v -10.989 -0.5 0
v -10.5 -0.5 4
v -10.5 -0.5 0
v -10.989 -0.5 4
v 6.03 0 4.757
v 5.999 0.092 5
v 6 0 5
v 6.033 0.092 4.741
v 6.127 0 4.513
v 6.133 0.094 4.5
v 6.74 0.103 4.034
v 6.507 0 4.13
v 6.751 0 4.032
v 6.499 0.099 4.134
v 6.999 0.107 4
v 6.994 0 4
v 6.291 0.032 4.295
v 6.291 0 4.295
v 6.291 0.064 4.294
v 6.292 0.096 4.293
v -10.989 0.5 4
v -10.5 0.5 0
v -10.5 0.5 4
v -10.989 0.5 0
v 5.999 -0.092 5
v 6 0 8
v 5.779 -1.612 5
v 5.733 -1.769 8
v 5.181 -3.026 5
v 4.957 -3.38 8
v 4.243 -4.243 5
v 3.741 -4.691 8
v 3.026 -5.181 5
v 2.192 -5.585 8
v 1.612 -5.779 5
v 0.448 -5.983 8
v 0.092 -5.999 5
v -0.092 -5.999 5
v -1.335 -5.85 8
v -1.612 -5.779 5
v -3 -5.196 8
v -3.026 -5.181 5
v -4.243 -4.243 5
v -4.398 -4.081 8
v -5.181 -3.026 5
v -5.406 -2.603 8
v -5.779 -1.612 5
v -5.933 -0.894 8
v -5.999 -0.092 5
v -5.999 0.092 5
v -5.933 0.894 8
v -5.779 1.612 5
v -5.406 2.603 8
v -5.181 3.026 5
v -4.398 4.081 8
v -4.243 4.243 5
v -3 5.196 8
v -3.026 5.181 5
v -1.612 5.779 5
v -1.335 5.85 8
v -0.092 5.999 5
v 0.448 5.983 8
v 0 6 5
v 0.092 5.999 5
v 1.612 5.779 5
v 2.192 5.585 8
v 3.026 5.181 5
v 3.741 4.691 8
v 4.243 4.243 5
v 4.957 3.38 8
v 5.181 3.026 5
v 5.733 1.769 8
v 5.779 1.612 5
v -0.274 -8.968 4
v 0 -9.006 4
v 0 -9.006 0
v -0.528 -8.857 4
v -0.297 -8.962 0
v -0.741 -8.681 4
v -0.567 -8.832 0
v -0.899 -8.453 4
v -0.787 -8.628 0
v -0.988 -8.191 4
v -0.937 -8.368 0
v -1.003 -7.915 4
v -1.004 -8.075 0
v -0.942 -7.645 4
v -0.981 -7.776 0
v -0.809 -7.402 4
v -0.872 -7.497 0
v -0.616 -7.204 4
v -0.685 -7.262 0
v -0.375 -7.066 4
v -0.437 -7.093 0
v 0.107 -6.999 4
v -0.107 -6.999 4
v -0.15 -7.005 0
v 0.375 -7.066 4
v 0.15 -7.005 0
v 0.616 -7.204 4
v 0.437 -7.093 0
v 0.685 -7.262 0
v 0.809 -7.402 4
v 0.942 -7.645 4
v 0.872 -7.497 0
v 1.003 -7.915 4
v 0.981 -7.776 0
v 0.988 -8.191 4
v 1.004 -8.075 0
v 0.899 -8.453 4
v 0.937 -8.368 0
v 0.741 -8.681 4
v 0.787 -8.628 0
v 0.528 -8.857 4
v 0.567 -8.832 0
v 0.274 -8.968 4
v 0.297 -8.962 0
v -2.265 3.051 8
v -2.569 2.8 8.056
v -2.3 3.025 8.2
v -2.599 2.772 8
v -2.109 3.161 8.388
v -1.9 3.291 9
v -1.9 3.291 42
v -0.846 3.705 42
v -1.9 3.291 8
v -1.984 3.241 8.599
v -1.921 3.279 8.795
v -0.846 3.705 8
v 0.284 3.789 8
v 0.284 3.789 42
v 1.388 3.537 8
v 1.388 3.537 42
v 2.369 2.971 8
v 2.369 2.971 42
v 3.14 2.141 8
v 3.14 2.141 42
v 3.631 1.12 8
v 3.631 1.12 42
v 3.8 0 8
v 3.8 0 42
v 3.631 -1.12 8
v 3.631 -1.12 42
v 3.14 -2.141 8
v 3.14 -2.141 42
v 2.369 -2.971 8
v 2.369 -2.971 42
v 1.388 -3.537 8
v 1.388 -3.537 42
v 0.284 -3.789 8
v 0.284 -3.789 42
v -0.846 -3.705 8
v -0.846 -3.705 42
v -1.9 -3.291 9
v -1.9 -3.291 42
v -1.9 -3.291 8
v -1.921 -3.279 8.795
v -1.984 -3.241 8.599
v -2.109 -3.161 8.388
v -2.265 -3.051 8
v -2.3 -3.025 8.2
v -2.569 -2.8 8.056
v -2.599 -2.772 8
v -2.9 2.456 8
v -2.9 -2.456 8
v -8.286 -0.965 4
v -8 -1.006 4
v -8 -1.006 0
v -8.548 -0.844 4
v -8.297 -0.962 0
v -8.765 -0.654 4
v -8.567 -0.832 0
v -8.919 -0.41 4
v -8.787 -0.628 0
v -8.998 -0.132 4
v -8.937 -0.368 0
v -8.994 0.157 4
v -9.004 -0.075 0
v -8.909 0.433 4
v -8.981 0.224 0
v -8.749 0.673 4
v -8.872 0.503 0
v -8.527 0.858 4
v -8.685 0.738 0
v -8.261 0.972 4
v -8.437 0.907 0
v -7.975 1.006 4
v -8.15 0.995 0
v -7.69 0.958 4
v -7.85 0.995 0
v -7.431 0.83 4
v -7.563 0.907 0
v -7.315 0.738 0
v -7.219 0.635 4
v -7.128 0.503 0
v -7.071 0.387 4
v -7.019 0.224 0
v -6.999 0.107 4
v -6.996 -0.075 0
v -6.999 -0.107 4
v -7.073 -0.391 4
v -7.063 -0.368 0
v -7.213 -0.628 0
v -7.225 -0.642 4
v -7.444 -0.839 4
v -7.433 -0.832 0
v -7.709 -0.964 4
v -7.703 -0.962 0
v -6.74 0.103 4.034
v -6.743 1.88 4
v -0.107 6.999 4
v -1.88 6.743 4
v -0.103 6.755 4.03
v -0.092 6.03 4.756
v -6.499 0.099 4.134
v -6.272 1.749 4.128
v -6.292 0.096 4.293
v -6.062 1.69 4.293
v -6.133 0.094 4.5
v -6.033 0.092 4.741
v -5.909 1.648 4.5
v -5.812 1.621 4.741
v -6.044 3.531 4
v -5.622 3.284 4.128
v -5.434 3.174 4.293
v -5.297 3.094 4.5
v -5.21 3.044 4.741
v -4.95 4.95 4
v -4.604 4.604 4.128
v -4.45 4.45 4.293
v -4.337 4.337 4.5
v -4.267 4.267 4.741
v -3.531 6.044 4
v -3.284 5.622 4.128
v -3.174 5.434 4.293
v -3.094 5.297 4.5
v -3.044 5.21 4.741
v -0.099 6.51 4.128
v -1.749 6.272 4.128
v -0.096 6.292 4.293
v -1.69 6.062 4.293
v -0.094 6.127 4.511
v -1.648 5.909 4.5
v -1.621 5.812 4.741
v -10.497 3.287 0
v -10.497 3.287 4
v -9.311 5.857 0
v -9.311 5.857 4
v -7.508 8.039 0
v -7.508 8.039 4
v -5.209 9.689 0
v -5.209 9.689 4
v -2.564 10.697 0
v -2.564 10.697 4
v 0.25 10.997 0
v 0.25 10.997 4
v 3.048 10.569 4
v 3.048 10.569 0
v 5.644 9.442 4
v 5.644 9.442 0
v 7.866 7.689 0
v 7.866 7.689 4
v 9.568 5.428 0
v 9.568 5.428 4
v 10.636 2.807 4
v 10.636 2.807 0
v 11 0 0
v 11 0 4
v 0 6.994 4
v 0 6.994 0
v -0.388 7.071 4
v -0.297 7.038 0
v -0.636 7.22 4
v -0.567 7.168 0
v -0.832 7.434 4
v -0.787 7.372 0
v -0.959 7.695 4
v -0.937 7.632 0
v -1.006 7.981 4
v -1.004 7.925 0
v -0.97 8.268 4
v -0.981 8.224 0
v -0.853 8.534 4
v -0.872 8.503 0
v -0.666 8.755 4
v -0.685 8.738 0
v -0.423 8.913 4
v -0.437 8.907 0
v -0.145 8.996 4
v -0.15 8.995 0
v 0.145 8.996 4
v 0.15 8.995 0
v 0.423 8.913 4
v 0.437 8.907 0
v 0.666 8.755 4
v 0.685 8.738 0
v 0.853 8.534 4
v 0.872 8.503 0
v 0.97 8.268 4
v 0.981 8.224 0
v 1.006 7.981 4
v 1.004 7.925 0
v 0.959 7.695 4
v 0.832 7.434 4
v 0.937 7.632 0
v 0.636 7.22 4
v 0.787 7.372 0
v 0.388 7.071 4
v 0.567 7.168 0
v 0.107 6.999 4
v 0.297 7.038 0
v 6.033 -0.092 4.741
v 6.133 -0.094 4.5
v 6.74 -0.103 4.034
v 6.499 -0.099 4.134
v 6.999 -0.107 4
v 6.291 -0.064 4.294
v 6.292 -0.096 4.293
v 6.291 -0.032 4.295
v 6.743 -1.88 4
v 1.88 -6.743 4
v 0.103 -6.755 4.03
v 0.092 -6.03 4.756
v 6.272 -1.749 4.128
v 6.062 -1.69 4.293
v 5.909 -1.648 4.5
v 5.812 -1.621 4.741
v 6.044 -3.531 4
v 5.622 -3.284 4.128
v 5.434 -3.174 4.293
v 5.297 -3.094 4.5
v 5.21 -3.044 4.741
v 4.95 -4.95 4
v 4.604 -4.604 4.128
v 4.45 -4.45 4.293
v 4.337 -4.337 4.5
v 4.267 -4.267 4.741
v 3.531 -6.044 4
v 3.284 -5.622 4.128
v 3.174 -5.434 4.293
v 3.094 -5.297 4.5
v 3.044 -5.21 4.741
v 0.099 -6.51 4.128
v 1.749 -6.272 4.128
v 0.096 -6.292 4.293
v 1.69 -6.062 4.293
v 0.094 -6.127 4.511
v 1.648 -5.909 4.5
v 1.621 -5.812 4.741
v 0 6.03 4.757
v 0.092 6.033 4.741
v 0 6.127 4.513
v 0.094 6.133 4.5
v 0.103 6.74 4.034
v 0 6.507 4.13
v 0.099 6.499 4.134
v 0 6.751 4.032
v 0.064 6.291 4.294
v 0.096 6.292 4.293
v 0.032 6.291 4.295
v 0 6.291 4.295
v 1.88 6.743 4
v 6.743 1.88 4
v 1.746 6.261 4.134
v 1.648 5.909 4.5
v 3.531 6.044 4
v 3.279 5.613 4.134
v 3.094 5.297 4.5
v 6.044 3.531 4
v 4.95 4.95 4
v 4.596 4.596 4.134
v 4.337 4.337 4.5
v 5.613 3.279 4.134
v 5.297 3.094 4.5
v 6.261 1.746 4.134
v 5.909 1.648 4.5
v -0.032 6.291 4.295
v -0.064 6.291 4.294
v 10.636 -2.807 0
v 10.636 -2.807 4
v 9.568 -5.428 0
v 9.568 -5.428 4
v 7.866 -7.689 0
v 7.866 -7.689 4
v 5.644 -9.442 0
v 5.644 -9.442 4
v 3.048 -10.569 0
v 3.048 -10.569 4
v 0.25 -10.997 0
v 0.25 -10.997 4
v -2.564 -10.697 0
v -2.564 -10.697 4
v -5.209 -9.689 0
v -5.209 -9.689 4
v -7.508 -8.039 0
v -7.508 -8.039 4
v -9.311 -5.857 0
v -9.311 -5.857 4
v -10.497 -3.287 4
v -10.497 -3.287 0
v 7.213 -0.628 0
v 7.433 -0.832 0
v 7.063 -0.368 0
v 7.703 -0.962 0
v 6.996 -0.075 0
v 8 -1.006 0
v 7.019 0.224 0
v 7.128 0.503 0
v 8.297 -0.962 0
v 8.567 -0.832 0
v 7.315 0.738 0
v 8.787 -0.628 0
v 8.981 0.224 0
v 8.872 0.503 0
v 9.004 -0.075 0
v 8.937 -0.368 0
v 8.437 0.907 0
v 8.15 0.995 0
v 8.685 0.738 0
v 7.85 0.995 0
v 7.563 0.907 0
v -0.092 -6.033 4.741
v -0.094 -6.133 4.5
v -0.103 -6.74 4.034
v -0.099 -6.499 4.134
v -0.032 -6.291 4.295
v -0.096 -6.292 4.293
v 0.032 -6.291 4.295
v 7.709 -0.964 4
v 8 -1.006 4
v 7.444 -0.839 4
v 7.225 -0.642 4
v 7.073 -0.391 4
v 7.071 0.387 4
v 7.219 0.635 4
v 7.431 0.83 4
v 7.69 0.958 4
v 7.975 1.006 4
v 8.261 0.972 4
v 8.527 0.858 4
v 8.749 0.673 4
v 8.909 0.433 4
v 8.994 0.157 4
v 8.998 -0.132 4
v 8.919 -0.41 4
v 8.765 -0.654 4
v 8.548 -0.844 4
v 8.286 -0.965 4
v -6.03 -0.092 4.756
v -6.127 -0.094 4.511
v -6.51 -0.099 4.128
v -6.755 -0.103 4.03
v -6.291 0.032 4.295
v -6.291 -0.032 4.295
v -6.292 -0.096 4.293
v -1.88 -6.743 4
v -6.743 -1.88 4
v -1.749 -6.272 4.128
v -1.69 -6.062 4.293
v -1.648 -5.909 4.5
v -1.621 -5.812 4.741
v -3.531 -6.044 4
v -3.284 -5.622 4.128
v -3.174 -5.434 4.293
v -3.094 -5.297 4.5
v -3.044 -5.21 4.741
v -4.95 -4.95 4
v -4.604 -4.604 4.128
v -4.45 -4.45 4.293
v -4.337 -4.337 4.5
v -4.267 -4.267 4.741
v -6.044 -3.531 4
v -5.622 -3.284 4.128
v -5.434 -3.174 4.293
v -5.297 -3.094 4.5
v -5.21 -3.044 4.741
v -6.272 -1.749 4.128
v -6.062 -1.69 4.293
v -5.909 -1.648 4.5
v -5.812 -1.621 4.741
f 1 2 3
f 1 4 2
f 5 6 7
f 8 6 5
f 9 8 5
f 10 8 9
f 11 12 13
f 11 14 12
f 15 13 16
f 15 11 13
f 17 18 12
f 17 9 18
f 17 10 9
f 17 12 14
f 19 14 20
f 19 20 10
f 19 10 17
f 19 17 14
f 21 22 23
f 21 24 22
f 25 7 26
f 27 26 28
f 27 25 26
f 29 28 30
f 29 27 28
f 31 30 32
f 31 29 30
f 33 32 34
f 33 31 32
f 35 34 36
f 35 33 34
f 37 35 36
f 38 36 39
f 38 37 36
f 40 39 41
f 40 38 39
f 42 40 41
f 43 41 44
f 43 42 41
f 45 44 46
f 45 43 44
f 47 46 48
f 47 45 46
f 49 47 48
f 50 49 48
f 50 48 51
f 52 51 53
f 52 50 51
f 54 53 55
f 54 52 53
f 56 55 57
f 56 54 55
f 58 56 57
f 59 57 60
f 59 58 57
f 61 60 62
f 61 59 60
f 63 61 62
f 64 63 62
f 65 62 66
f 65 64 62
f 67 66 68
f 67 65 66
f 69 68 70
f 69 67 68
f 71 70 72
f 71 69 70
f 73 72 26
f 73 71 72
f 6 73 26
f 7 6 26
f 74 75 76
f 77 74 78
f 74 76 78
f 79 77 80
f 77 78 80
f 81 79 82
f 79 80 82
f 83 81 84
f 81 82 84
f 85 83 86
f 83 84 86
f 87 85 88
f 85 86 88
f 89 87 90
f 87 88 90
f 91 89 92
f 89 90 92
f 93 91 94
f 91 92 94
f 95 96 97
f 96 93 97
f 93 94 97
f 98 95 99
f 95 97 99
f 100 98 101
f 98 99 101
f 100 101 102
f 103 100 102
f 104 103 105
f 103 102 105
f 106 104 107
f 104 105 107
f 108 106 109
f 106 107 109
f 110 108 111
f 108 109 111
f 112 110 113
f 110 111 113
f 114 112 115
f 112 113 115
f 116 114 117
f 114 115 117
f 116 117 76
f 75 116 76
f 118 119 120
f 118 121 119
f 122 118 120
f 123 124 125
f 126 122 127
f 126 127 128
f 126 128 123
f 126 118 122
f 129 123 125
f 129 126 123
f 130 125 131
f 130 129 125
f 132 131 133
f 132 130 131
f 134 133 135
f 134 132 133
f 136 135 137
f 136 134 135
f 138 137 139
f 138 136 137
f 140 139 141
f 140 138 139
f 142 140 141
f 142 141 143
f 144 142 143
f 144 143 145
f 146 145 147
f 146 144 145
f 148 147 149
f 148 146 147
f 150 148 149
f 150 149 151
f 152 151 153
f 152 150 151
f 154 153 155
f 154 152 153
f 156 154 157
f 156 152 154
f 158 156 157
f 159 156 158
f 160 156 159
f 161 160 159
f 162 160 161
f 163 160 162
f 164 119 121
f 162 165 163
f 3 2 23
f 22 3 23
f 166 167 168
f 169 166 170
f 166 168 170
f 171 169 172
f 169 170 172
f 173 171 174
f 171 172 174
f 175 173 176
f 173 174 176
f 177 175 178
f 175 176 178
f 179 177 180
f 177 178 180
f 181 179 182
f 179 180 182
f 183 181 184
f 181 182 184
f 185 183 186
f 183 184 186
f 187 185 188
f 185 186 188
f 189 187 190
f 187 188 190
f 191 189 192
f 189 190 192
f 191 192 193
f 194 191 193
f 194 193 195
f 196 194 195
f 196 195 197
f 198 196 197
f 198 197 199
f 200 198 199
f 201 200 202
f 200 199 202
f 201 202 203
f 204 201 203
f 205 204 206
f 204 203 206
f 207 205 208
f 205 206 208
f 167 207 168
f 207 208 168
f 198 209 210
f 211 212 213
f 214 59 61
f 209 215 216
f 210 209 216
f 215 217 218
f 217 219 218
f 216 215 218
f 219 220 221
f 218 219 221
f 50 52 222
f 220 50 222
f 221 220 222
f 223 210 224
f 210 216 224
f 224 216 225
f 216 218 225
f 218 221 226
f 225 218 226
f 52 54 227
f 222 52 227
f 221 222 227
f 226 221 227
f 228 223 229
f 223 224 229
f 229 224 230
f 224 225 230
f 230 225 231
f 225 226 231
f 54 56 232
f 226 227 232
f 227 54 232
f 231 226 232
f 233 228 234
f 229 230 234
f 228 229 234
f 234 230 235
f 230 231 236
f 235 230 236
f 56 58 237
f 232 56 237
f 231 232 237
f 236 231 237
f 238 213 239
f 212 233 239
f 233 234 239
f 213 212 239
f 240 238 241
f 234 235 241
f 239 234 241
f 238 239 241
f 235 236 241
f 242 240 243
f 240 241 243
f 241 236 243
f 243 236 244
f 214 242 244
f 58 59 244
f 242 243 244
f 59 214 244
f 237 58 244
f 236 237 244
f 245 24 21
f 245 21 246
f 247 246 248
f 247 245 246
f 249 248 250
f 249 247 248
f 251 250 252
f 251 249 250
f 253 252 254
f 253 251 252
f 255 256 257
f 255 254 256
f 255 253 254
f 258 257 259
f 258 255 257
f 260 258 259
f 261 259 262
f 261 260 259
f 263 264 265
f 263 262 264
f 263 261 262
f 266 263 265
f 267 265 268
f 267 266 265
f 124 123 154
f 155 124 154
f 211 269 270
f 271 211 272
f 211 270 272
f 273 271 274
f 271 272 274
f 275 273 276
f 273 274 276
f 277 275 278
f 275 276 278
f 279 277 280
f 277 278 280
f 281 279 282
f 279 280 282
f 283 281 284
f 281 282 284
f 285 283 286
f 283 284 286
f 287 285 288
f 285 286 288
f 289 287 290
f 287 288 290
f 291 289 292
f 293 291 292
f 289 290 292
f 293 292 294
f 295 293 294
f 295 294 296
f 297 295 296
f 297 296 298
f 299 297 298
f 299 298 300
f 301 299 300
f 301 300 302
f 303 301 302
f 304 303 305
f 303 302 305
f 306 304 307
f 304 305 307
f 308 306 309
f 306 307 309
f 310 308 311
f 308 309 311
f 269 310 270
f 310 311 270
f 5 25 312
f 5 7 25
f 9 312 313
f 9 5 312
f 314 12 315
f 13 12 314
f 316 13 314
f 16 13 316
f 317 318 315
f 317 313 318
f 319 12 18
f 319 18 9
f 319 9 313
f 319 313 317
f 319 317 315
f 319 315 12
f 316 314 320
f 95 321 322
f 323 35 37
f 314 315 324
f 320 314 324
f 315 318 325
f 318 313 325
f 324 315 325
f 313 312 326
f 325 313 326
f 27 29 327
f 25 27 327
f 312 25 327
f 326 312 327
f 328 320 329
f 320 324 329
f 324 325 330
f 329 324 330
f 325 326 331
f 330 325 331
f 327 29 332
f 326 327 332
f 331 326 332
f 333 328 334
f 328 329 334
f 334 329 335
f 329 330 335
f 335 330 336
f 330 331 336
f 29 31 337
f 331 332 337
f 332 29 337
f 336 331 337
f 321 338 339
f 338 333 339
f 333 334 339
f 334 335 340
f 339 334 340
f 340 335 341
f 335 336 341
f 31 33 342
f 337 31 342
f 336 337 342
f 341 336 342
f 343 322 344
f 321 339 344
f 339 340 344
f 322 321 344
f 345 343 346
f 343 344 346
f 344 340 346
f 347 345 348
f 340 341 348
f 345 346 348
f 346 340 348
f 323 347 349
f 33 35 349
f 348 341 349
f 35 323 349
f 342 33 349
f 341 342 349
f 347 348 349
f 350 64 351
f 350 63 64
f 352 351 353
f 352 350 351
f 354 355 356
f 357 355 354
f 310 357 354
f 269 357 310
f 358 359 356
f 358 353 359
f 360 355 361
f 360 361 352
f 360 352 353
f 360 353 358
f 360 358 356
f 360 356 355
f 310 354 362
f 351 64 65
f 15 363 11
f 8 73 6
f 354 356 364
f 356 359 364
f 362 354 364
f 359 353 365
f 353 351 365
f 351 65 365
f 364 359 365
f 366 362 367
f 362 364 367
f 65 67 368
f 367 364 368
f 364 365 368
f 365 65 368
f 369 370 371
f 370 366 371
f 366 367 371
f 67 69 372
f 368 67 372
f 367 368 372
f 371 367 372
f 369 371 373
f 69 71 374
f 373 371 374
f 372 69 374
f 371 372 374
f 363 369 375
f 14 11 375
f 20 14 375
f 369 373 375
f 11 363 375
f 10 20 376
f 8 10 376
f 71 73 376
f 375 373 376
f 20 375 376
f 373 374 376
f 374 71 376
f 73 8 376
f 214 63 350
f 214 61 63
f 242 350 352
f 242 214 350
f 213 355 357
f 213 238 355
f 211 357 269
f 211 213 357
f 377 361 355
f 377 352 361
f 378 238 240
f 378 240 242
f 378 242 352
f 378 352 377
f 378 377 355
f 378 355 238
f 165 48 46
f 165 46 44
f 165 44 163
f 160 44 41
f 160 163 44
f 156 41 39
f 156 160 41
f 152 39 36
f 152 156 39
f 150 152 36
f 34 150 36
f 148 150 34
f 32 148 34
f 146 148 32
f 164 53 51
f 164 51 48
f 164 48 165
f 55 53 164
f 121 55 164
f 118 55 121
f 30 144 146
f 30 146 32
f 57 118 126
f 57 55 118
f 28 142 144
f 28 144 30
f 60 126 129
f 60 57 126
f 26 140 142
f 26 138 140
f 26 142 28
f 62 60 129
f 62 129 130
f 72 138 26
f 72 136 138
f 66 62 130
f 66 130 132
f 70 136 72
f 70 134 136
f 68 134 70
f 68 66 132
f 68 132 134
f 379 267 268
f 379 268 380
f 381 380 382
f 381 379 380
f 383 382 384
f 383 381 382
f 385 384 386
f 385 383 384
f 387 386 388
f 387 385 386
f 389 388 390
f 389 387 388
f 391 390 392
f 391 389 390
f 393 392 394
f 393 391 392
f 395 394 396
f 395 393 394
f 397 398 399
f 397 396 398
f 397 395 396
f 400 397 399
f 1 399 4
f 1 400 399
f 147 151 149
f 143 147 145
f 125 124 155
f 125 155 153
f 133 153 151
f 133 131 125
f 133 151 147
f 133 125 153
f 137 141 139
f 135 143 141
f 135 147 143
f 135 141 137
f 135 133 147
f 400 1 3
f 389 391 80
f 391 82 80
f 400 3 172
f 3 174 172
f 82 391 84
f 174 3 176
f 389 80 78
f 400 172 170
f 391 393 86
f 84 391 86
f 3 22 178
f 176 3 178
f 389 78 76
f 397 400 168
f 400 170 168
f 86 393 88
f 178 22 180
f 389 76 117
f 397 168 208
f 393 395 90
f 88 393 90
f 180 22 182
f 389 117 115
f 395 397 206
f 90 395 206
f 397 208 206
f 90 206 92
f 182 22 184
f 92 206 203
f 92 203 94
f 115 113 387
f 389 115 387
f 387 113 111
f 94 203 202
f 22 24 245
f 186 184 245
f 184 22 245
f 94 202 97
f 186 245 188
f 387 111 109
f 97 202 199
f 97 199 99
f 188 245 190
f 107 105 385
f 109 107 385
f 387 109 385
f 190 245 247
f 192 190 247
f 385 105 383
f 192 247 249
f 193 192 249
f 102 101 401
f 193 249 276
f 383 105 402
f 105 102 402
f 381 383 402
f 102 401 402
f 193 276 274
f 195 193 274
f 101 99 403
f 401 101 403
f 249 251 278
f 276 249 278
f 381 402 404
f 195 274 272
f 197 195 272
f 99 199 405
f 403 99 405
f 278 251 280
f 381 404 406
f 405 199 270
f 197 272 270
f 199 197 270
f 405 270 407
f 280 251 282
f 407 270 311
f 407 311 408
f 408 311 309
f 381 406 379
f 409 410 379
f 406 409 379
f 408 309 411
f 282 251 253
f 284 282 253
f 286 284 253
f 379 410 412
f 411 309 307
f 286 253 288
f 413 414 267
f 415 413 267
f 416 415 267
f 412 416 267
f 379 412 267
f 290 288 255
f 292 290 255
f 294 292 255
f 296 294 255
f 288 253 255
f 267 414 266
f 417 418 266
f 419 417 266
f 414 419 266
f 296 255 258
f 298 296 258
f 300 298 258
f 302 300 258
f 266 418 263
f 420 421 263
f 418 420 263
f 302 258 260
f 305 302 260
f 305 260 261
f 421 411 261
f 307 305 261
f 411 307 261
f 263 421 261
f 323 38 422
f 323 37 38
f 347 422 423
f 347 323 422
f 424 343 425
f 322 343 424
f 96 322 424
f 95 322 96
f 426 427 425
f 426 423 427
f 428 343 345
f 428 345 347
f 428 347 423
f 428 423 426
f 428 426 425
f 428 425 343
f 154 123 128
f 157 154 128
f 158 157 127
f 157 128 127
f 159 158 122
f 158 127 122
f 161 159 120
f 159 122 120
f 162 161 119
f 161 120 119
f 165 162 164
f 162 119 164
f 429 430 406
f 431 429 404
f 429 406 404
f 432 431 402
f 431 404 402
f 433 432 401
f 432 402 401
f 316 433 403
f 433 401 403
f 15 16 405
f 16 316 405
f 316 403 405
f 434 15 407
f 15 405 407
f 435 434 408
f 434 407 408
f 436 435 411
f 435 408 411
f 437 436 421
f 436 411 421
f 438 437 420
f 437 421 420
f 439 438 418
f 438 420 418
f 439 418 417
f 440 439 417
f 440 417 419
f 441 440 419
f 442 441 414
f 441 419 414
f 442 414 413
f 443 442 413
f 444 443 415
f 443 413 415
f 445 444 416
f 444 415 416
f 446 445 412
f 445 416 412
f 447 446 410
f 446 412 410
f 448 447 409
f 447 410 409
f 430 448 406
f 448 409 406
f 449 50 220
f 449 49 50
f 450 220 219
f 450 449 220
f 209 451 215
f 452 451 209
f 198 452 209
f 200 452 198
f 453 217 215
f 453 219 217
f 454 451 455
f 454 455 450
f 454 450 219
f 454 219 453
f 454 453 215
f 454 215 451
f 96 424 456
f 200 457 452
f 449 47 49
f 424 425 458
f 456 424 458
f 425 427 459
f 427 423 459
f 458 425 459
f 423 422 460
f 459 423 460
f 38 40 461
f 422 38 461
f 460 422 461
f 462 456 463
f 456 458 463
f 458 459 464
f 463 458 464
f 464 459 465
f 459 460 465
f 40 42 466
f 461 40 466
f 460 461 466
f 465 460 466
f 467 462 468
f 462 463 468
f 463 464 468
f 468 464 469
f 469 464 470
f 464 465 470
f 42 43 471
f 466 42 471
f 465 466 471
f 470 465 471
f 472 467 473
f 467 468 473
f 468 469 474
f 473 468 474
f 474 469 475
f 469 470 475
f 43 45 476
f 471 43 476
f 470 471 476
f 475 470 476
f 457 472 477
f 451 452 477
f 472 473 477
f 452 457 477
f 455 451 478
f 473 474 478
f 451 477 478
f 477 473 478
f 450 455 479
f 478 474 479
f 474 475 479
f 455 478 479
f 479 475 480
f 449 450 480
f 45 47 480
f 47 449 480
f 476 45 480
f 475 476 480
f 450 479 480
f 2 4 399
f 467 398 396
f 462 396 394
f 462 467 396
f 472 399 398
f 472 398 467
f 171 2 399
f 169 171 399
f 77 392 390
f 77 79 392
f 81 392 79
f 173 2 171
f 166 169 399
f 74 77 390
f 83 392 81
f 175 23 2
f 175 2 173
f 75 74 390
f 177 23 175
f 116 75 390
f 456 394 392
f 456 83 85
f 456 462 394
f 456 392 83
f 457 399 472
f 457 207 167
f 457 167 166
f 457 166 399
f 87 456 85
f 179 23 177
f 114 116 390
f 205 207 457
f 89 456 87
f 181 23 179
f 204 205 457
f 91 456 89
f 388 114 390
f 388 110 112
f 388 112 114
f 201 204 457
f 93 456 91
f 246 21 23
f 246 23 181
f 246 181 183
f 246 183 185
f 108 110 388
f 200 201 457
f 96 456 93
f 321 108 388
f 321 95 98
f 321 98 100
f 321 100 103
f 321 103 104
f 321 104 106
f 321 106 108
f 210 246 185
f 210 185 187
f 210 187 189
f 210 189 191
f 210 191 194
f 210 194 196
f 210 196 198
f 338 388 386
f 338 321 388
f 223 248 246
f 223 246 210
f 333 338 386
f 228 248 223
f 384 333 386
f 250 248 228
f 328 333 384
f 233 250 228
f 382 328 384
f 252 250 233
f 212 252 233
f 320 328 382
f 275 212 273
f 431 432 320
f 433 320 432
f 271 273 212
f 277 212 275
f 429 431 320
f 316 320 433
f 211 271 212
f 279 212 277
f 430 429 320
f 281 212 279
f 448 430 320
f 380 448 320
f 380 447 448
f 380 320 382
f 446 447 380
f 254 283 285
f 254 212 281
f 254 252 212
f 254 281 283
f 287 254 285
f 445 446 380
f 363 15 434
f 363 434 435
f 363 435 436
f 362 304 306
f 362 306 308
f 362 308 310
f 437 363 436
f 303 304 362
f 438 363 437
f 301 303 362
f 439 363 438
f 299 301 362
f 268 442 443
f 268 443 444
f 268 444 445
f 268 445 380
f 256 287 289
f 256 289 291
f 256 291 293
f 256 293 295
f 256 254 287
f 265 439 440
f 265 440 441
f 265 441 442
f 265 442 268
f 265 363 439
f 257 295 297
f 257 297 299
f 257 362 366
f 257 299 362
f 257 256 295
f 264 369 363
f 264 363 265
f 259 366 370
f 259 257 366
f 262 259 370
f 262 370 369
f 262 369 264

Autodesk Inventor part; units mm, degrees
ref_plane "XZ Plane" through (0, 0, 0) normal (0, 1, 0) x (-1, 0, 0)
ref_plane "XY Plane" through (0, 0, 0) normal (0, 0, 1) x (1, 0, 0)
sketch "Boceto1" plane through (0, 0, 0) normal (0, 0, 1) x (1, 0, 0)
  circle A0 centre (0, 0) radius 11
  dimension "DIAMETROBRIDA" = 22
extrude "Extrusión1" add sketch "Boceto1" along normal blind 4
sketch "Boceto2" plane through (0, 0, 4) normal (0, 0, 1) x (1, 0, 0)
  circle A0 centre (0, 8) radius 1.05
  circle A1 centre (-8, 0) radius 1.05
  circle A2 centre (8, 0) radius 1.05
  circle A3 centre (0, -8) radius 1.05
  circle A4 centre (0, 0) radius 11 projected
  dimension "d7" = 2.1
  dimension "d8" = 2.1
  dimension "d9" = 2.1
  dimension "d10" = 2.1
  dimension "DistanciaBarrenos" = 8
  dimension "d31" = 8
  dimension "d32" = 8
  dimension "d33" = 8
hole "Agujero1" at (0, 8, 4) at (-8, 0, 4) at (8, 0, 4) at (0, -8, 4) direction (0, 0, -1) diameter 2.013 end through all thread size "M2.5x0.45" class "6H" standard "ISO Metric profile"
sketch "Boceto3" plane through (0, 0, 4) normal (0, 0, 1) x (1, 0, 0)
  circle A0 centre (0, 0) radius 6
  dimension "DIAMETROBASE" = 12
extrude "Extrusión2" add sketch "Boceto3" along normal blind 4
sketch "Boceto4" plane through (0, 0, 8) normal (0, 0, 1) x (1, 0, 0)
  arc A0 (-1.9, -3.2909) -> (-1.9, 3.2909) centre (0, 0) ccw
  line L0 (0, 0) -> (-2, 0)
  line L1 (-1.9, 3.2909) -> (-1.9, -3.2909)
  circle A1 centre (0, 0) radius 6 projected
  dimension "DIAMETROEJE" = 7.6
  dimension "d29" = 1.9
  dimension "d38" = 2
extrude "Extrusión3" add sketch "Boceto4" along normal blind 34 contours L1 A0
ref_plane "Plano de trabajo1" through (-11, 0, 0) normal (1, 0, 0) x (0, 1, 0)
sketch "Boceto7" plane through (-11, 0, 0) normal (1, 0, 0) x (0, 1, 0)
  line L0 (0.5, 4) -> (-0.5, 4)
  line L1 (-0.5, 4) -> (-0.5, 0)
  line L2 (-0.5, 0) -> (0.5, 0)
  line L3 (0.5, 0) -> (0.5, 4)
  line L4 (0.5, 4) -> (-0.5, 0) construction
  line L5 (-0.5, 4) -> (0.5, 0) construction
  point P0 (0, 0)
  point P1 (0, 2)
  dimension "d34" = 1
  dimension "d35" = 4
extrude "Extrusión4" cut sketch "Boceto7" along normal blind 0.5
fillet "Empalme5" radius 1 2 edges at (-1.9, 0, 8) (-6, 0, 4)
equation "\"d8\" = d7"
equation "\"d9\" = d7"
equation "\"d10\" = d7"
equation "\"d31\" = DistanciaBarrenos"
equation "\"d32\" = DistanciaBarrenos"
equation "\"d33\" = DistanciaBarrenos"
equation "\"d29\" = 0.25 * DIAMETROEJE"
properties part number "BM-AX12" material "PETG"
